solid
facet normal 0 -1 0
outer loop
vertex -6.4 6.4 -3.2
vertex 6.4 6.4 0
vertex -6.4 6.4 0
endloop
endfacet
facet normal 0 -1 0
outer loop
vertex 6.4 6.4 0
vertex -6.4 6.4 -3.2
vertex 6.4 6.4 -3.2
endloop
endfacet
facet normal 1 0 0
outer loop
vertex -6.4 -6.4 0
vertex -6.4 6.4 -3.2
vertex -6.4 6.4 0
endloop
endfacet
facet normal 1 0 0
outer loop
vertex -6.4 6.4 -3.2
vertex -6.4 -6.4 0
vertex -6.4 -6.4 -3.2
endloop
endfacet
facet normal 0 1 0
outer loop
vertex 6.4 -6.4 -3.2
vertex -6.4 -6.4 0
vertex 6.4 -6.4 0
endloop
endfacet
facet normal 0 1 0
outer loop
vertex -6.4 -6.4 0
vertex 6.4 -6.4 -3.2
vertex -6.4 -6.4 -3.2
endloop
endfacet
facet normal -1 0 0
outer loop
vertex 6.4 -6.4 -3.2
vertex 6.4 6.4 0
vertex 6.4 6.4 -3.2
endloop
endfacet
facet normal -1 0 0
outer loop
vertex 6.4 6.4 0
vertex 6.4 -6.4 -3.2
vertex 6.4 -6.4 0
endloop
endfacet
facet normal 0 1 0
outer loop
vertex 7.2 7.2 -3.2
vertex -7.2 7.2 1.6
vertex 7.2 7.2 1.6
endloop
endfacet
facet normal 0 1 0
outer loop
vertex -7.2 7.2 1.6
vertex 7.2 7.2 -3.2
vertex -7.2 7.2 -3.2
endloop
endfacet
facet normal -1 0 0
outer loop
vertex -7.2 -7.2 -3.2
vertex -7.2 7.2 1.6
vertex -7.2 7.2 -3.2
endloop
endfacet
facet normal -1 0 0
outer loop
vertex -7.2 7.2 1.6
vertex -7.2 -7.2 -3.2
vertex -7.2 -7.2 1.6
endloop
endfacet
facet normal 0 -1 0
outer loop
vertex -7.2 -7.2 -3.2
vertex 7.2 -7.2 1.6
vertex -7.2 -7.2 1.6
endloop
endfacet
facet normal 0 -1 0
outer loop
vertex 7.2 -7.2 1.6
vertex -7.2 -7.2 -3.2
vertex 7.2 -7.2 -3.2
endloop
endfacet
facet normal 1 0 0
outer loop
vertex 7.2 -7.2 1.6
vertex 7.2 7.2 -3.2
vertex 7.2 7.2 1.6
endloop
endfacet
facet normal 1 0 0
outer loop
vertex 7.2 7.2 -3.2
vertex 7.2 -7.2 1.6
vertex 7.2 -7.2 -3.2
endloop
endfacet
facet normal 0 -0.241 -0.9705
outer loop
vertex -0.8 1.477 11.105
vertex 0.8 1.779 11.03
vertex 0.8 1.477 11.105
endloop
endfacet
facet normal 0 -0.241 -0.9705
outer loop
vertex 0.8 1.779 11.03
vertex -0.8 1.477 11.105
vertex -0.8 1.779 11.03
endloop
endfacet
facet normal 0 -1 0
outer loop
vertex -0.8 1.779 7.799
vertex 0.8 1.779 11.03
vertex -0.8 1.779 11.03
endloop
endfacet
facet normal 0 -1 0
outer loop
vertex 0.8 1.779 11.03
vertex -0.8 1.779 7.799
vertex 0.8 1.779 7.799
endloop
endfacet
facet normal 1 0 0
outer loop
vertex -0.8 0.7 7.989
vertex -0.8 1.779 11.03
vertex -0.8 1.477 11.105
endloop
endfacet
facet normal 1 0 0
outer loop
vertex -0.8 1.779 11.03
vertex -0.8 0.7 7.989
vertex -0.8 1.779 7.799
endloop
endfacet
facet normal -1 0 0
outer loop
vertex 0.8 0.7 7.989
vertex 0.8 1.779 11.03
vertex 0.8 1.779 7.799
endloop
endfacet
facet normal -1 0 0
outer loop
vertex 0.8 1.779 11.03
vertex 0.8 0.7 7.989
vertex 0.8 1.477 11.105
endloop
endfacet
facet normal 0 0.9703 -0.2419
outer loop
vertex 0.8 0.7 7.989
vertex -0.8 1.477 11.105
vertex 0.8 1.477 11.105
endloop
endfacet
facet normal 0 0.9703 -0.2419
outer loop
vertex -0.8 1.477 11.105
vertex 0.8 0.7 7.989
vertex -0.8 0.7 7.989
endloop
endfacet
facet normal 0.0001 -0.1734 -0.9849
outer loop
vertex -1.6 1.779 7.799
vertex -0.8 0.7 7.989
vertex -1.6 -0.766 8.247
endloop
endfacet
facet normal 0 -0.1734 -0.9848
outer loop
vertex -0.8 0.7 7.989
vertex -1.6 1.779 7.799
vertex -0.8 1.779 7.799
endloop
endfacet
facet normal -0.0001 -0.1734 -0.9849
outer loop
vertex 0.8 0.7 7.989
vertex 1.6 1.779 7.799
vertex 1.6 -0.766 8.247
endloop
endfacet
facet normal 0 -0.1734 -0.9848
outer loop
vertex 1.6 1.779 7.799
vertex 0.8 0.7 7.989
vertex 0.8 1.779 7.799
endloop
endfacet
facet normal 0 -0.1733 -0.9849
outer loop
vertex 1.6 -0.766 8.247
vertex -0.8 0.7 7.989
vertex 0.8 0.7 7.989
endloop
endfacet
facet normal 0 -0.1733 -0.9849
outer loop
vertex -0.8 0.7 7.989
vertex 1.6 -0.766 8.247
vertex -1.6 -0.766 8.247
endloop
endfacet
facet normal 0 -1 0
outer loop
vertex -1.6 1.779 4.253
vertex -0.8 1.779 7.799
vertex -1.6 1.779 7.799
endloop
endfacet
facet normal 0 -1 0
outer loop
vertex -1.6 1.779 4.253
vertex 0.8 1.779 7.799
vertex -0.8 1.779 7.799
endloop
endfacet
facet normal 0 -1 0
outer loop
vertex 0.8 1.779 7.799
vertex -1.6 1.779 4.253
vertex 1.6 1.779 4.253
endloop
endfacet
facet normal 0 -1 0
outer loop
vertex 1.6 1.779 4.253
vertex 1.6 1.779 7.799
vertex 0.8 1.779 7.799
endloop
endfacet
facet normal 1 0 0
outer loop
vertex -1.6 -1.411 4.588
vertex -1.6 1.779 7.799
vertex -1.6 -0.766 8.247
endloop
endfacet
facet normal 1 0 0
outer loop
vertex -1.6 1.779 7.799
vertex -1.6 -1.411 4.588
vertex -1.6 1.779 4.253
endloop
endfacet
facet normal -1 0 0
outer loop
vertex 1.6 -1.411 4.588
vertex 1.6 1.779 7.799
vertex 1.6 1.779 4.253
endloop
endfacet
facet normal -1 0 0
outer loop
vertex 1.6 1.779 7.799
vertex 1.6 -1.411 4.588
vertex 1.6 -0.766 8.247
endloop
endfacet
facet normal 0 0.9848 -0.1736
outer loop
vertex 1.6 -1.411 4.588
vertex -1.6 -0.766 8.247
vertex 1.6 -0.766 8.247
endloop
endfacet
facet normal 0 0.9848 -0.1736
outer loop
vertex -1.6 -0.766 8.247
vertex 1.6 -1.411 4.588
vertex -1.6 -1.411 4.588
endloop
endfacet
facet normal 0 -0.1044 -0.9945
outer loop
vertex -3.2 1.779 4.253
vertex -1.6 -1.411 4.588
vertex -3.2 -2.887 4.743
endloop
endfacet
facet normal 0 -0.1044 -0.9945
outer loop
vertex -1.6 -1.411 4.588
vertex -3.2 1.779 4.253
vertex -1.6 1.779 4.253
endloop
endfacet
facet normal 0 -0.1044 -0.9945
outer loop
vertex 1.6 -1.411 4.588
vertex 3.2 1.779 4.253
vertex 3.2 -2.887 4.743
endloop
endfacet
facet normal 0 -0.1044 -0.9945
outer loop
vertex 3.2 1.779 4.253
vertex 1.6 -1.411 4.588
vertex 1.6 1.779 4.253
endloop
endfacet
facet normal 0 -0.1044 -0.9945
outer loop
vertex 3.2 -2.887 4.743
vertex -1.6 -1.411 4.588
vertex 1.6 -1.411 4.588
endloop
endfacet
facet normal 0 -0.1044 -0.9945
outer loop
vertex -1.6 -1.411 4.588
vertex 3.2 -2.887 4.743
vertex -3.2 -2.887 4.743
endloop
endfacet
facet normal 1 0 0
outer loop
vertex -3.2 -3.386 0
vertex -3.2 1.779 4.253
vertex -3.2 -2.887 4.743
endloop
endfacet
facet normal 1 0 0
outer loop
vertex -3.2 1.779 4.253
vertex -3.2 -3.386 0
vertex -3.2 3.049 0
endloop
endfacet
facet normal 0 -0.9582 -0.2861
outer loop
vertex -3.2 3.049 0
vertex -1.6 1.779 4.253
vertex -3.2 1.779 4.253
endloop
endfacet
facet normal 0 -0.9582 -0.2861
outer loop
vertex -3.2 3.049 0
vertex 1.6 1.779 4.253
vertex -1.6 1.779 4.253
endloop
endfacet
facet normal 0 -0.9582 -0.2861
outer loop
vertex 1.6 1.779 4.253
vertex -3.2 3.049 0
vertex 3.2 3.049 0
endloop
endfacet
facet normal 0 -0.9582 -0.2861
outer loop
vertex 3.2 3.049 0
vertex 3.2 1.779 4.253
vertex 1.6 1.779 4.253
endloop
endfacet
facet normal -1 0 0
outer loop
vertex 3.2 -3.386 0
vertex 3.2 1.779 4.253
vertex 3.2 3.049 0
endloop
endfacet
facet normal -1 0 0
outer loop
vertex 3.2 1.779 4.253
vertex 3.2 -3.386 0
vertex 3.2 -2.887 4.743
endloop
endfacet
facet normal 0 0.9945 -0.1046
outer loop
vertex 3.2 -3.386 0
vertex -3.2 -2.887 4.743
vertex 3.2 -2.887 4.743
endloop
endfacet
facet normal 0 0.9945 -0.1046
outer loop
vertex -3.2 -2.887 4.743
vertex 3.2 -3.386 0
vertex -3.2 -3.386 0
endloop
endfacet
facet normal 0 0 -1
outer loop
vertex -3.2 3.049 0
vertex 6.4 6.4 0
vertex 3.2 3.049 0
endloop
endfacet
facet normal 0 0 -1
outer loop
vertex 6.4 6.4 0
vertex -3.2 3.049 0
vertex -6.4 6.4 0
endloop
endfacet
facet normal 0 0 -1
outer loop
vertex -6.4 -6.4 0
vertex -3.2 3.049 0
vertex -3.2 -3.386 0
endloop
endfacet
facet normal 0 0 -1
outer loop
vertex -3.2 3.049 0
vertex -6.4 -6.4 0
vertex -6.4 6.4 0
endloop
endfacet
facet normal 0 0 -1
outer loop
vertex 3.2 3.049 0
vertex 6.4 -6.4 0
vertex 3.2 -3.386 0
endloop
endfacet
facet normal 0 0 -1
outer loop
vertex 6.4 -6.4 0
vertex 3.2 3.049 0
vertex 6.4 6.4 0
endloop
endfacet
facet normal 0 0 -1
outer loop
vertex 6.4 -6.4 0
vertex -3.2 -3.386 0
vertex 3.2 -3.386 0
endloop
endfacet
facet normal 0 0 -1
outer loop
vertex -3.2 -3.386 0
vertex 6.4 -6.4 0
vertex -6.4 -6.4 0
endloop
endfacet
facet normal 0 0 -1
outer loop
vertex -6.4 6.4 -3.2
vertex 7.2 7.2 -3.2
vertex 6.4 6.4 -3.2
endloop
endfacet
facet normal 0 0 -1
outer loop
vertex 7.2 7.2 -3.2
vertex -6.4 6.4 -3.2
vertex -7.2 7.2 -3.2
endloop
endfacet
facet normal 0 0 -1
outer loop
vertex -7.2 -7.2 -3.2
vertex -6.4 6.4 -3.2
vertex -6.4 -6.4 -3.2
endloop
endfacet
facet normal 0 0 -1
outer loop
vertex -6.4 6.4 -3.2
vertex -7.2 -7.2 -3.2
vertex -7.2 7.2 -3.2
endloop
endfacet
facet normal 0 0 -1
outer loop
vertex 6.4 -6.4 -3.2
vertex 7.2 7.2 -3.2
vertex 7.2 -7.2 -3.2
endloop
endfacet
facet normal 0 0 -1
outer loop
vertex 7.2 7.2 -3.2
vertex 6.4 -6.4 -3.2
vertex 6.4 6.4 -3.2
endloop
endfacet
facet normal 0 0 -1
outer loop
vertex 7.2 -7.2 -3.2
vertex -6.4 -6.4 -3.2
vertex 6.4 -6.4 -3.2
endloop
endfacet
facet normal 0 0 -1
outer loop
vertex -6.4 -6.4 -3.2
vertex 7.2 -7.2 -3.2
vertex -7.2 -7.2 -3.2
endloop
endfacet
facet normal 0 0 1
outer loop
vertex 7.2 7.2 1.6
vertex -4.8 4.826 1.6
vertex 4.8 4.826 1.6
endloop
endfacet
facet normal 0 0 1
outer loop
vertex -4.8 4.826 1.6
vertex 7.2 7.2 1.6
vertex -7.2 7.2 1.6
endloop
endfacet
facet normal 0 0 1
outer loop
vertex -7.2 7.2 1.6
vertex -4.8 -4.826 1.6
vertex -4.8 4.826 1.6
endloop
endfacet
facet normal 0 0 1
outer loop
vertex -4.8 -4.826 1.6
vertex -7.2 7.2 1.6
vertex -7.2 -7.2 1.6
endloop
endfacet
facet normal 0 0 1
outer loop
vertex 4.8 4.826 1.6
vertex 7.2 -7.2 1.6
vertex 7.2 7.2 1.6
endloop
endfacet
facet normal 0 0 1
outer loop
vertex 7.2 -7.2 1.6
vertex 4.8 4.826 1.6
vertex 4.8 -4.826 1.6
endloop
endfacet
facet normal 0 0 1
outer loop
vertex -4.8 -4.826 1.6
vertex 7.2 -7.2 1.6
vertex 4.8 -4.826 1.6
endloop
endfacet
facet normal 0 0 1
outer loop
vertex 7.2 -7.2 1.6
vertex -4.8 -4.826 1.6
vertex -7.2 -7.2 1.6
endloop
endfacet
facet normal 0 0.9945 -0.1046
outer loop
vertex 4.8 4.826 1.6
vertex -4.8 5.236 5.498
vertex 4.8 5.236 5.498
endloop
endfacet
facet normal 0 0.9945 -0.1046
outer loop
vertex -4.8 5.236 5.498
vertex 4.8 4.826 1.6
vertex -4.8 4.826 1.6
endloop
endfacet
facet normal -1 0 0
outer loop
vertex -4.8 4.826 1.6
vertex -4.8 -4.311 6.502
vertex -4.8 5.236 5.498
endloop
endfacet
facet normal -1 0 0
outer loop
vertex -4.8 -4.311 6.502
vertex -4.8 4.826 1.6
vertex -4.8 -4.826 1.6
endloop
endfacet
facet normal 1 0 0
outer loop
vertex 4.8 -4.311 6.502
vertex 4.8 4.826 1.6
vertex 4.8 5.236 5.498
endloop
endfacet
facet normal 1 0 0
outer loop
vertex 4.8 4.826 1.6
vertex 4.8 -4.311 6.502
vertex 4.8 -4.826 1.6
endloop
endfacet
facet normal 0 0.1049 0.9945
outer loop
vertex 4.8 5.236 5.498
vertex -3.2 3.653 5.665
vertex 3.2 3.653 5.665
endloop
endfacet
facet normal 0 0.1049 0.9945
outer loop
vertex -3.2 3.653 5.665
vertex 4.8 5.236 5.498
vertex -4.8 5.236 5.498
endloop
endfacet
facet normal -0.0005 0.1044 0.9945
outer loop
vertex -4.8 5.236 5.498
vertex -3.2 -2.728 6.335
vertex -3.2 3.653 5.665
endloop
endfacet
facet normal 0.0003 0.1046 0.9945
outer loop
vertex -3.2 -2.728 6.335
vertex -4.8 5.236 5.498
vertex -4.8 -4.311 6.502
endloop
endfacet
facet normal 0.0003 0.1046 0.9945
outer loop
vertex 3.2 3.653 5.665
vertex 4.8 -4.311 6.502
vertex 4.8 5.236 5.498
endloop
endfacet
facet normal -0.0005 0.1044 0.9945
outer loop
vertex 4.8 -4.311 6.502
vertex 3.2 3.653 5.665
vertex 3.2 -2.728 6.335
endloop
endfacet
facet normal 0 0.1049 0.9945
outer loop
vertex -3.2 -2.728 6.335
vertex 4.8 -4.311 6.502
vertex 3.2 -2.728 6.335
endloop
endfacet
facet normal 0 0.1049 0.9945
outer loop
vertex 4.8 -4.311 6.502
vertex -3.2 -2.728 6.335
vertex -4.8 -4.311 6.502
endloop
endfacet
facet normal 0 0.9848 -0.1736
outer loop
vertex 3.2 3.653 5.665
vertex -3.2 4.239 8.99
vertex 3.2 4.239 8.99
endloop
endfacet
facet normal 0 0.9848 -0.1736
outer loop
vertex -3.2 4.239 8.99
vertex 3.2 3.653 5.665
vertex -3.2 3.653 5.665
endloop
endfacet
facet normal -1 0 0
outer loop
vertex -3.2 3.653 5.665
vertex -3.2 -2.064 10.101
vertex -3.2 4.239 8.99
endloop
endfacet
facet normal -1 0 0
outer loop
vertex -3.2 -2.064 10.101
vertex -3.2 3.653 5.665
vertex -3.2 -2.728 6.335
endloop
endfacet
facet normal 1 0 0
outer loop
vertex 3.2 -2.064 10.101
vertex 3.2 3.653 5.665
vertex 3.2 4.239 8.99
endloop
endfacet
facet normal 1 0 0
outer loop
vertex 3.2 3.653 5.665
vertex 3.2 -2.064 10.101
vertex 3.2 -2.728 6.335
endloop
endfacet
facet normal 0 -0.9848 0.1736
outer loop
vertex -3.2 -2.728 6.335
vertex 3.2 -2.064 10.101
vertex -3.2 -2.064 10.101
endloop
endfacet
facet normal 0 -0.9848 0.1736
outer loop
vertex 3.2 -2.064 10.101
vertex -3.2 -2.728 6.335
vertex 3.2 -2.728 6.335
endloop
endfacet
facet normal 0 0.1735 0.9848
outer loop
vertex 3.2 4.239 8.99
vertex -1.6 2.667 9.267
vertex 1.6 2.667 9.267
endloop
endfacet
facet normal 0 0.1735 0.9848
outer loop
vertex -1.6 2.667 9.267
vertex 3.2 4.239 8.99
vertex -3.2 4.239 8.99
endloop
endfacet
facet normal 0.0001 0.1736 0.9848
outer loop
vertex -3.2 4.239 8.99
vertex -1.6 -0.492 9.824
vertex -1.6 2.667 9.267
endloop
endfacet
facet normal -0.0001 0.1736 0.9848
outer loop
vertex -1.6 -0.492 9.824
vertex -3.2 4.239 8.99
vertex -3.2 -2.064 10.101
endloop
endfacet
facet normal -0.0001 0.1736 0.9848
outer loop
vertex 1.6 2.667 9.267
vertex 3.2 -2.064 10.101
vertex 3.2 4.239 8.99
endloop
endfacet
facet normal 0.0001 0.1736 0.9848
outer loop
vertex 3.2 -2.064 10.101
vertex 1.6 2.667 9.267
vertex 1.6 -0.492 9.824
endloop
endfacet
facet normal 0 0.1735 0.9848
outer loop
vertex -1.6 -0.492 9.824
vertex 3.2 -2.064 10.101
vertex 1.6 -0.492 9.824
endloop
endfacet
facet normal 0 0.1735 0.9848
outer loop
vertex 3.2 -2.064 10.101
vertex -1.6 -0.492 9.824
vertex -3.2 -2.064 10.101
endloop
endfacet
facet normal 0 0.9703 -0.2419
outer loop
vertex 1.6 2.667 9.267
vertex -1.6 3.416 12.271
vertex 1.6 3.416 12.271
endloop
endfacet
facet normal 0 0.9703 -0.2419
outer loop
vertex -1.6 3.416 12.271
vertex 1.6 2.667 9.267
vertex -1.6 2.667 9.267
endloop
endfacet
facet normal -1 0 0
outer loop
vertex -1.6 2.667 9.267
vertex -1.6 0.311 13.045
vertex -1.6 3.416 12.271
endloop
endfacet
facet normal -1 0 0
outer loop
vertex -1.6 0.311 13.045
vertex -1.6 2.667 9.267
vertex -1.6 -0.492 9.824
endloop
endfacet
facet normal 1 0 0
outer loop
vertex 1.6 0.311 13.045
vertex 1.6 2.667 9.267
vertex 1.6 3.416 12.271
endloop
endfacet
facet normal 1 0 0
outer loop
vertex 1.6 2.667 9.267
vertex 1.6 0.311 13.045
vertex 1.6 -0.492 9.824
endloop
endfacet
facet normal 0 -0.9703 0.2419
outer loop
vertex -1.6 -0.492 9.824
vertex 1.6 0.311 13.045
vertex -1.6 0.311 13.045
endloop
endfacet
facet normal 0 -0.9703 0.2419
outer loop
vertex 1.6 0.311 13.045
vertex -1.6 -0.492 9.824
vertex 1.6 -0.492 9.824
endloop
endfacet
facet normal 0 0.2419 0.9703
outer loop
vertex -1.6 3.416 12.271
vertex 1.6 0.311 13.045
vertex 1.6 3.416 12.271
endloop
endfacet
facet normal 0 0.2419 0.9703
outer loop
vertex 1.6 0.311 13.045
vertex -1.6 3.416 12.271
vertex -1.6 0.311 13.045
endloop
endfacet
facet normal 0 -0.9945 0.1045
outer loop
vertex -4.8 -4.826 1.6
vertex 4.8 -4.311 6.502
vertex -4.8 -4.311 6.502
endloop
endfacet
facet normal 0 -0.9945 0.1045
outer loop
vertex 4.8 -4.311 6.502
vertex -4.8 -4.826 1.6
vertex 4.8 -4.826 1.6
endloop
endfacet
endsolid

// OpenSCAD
// file: ../p/box4.scad
use <../lib.scad>
function ldraw_lib__box4() = [
// 0 Box with 4 Faces (2 Parallel Pairs) and All Edges
// 0 Name: box4.dat
// 0 Author: James Jessiman
// 0 !LDRAW_ORG Primitive UPDATE 2012-01
// 0 !LICENSE Licensed under CC BY 4.0 : see CAreadme.txt
// 
// 0 BFC CERTIFY CCW
  [0,"BFC","CERTIFY"],
  [0,"BFC","CCW"],
// 
// 0 !HISTORY 2002-04-03 [sbliss] Modified for BFC compliance
// 0 !HISTORY 2002-04-25 [PTadmin] Official Update 2002-02
// 0 !HISTORY 2007-06-24 [PTadmin] Header formatted for Contributor Agreement
// 0 !HISTORY 2008-07-01 [PTadmin] Official Update 2008-01
// 0 !HISTORY 2012-02-16 [Philo] Changed to CCW
// 0 !HISTORY 2012-03-30 [PTadmin] Official Update 2012-01
// 
// 
// 2 24 1 1 1 -1 1 1
  [2,24,1,1,1,-1,1,1],
// 2 24 -1 1 1 -1 1 -1
  [2,24,-1,1,1,-1,1,-1],
// 2 24 -1 1 -1 1 1 -1
  [2,24,-1,1,-1,1,1,-1],
// 2 24 1 1 -1 1 1 1
  [2,24,1,1,-1,1,1,1],
// 2 24 1 0 1 -1 0 1
  [2,24,1,0,1,-1,0,1],
// 2 24 -1 0 1 -1 0 -1
  [2,24,-1,0,1,-1,0,-1],
// 2 24 -1 0 -1 1 0 -1
  [2,24,-1,0,-1,1,0,-1],
// 2 24 1 0 -1 1 0 1
  [2,24,1,0,-1,1,0,1],
// 2 24 1 0 1 1 1 1
  [2,24,1,0,1,1,1,1],
// 2 24 -1 0 1 -1 1 1
  [2,24,-1,0,1,-1,1,1],
// 2 24 1 0 -1 1 1 -1
  [2,24,1,0,-1,1,1,-1],
// 2 24 -1 0 -1 -1 1 -1
  [2,24,-1,0,-1,-1,1,-1],
// 4 16 -1 1 1 -1 0 1 1 0 1 1 1 1
  [4,16,-1,1,1,-1,0,1,1,0,1,1,1,1],
// 4 16 -1 1 -1 -1 0 -1 -1 0 1 -1 1 1
  [4,16,-1,1,-1,-1,0,-1,-1,0,1,-1,1,1],
// 4 16 1 1 -1 1 0 -1 -1 0 -1 -1 1 -1
  [4,16,1,1,-1,1,0,-1,-1,0,-1,-1,1,-1],
// 4 16 1 1 1 1 0 1 1 0 -1 1 1 -1
  [4,16,1,1,1,1,0,1,1,0,-1,1,1,-1],
];
module ldraw_lib__box4(step=0, col=false, unit=2/5, alt=false, line=0.2, solid=!$preview)
    makepoly(ldraw_lib__box4(), step=step, col=col, unit=unit, alt=alt, line=line, solid=solid);
ldraw_lib__box4(line=0.2);
// main file
use <../lib.scad>
use <s/u9563s01.scad>
function ldraw_lib__u9563() = [
// 0 ~Minifig Hat Cuboid with 3 Sloped Steps
// 0 Name: u9563.dat
// 0 Author: Massimo Maso [Sirio]
// 0 !LDRAW_ORG Part UPDATE 2025-04
// 0 !LICENSE Licensed under CC BY 4.0 : see CAreadme.txt
// 
// 0 !HELP This is the old, undetachable version (dual mold or glued) of the witch hat. Do not mistaken it for the new detachable version 3485.
// 
// 0 BFC CERTIFY CCW
  [0,"BFC","CERTIFY"],
  [0,"BFC","CCW"],
// 
// 0 !CATEGORY Minifig Headwear
// 0 !KEYWORDS Accessory, Minecraft
// 
// 0 !HISTORY 2025-04-27 [OrionP] Official Update 2025-04
// 
// 
// 1 16 0 0 0 1 0 0 0 1 0 0 0 1 s\u9563s01.dat
  [1,16,0,0,0,1,0,0,0,1,0,0,0,1, ldraw_lib__s__u9563s01()],
// 4 16 -12 -4 -12.0661 12 -4 -12.0661 12 -16.2543 -10.7781 -12 -16.2543 -10.7781
  [4,16,-12,-4,-12.0661,12,-4,-12.0661,12,-16.2543,-10.7781,-12,-16.2543,-10.7781],
];
module ldraw_lib__u9563(step=0, col=false, unit=2/5, alt=false, line=0.2, solid=!$preview)
    makepoly(ldraw_lib__u9563(), step=step, col=col, unit=unit, alt=alt, line=line, solid=solid);
ldraw_lib__u9563(line=0.2);
